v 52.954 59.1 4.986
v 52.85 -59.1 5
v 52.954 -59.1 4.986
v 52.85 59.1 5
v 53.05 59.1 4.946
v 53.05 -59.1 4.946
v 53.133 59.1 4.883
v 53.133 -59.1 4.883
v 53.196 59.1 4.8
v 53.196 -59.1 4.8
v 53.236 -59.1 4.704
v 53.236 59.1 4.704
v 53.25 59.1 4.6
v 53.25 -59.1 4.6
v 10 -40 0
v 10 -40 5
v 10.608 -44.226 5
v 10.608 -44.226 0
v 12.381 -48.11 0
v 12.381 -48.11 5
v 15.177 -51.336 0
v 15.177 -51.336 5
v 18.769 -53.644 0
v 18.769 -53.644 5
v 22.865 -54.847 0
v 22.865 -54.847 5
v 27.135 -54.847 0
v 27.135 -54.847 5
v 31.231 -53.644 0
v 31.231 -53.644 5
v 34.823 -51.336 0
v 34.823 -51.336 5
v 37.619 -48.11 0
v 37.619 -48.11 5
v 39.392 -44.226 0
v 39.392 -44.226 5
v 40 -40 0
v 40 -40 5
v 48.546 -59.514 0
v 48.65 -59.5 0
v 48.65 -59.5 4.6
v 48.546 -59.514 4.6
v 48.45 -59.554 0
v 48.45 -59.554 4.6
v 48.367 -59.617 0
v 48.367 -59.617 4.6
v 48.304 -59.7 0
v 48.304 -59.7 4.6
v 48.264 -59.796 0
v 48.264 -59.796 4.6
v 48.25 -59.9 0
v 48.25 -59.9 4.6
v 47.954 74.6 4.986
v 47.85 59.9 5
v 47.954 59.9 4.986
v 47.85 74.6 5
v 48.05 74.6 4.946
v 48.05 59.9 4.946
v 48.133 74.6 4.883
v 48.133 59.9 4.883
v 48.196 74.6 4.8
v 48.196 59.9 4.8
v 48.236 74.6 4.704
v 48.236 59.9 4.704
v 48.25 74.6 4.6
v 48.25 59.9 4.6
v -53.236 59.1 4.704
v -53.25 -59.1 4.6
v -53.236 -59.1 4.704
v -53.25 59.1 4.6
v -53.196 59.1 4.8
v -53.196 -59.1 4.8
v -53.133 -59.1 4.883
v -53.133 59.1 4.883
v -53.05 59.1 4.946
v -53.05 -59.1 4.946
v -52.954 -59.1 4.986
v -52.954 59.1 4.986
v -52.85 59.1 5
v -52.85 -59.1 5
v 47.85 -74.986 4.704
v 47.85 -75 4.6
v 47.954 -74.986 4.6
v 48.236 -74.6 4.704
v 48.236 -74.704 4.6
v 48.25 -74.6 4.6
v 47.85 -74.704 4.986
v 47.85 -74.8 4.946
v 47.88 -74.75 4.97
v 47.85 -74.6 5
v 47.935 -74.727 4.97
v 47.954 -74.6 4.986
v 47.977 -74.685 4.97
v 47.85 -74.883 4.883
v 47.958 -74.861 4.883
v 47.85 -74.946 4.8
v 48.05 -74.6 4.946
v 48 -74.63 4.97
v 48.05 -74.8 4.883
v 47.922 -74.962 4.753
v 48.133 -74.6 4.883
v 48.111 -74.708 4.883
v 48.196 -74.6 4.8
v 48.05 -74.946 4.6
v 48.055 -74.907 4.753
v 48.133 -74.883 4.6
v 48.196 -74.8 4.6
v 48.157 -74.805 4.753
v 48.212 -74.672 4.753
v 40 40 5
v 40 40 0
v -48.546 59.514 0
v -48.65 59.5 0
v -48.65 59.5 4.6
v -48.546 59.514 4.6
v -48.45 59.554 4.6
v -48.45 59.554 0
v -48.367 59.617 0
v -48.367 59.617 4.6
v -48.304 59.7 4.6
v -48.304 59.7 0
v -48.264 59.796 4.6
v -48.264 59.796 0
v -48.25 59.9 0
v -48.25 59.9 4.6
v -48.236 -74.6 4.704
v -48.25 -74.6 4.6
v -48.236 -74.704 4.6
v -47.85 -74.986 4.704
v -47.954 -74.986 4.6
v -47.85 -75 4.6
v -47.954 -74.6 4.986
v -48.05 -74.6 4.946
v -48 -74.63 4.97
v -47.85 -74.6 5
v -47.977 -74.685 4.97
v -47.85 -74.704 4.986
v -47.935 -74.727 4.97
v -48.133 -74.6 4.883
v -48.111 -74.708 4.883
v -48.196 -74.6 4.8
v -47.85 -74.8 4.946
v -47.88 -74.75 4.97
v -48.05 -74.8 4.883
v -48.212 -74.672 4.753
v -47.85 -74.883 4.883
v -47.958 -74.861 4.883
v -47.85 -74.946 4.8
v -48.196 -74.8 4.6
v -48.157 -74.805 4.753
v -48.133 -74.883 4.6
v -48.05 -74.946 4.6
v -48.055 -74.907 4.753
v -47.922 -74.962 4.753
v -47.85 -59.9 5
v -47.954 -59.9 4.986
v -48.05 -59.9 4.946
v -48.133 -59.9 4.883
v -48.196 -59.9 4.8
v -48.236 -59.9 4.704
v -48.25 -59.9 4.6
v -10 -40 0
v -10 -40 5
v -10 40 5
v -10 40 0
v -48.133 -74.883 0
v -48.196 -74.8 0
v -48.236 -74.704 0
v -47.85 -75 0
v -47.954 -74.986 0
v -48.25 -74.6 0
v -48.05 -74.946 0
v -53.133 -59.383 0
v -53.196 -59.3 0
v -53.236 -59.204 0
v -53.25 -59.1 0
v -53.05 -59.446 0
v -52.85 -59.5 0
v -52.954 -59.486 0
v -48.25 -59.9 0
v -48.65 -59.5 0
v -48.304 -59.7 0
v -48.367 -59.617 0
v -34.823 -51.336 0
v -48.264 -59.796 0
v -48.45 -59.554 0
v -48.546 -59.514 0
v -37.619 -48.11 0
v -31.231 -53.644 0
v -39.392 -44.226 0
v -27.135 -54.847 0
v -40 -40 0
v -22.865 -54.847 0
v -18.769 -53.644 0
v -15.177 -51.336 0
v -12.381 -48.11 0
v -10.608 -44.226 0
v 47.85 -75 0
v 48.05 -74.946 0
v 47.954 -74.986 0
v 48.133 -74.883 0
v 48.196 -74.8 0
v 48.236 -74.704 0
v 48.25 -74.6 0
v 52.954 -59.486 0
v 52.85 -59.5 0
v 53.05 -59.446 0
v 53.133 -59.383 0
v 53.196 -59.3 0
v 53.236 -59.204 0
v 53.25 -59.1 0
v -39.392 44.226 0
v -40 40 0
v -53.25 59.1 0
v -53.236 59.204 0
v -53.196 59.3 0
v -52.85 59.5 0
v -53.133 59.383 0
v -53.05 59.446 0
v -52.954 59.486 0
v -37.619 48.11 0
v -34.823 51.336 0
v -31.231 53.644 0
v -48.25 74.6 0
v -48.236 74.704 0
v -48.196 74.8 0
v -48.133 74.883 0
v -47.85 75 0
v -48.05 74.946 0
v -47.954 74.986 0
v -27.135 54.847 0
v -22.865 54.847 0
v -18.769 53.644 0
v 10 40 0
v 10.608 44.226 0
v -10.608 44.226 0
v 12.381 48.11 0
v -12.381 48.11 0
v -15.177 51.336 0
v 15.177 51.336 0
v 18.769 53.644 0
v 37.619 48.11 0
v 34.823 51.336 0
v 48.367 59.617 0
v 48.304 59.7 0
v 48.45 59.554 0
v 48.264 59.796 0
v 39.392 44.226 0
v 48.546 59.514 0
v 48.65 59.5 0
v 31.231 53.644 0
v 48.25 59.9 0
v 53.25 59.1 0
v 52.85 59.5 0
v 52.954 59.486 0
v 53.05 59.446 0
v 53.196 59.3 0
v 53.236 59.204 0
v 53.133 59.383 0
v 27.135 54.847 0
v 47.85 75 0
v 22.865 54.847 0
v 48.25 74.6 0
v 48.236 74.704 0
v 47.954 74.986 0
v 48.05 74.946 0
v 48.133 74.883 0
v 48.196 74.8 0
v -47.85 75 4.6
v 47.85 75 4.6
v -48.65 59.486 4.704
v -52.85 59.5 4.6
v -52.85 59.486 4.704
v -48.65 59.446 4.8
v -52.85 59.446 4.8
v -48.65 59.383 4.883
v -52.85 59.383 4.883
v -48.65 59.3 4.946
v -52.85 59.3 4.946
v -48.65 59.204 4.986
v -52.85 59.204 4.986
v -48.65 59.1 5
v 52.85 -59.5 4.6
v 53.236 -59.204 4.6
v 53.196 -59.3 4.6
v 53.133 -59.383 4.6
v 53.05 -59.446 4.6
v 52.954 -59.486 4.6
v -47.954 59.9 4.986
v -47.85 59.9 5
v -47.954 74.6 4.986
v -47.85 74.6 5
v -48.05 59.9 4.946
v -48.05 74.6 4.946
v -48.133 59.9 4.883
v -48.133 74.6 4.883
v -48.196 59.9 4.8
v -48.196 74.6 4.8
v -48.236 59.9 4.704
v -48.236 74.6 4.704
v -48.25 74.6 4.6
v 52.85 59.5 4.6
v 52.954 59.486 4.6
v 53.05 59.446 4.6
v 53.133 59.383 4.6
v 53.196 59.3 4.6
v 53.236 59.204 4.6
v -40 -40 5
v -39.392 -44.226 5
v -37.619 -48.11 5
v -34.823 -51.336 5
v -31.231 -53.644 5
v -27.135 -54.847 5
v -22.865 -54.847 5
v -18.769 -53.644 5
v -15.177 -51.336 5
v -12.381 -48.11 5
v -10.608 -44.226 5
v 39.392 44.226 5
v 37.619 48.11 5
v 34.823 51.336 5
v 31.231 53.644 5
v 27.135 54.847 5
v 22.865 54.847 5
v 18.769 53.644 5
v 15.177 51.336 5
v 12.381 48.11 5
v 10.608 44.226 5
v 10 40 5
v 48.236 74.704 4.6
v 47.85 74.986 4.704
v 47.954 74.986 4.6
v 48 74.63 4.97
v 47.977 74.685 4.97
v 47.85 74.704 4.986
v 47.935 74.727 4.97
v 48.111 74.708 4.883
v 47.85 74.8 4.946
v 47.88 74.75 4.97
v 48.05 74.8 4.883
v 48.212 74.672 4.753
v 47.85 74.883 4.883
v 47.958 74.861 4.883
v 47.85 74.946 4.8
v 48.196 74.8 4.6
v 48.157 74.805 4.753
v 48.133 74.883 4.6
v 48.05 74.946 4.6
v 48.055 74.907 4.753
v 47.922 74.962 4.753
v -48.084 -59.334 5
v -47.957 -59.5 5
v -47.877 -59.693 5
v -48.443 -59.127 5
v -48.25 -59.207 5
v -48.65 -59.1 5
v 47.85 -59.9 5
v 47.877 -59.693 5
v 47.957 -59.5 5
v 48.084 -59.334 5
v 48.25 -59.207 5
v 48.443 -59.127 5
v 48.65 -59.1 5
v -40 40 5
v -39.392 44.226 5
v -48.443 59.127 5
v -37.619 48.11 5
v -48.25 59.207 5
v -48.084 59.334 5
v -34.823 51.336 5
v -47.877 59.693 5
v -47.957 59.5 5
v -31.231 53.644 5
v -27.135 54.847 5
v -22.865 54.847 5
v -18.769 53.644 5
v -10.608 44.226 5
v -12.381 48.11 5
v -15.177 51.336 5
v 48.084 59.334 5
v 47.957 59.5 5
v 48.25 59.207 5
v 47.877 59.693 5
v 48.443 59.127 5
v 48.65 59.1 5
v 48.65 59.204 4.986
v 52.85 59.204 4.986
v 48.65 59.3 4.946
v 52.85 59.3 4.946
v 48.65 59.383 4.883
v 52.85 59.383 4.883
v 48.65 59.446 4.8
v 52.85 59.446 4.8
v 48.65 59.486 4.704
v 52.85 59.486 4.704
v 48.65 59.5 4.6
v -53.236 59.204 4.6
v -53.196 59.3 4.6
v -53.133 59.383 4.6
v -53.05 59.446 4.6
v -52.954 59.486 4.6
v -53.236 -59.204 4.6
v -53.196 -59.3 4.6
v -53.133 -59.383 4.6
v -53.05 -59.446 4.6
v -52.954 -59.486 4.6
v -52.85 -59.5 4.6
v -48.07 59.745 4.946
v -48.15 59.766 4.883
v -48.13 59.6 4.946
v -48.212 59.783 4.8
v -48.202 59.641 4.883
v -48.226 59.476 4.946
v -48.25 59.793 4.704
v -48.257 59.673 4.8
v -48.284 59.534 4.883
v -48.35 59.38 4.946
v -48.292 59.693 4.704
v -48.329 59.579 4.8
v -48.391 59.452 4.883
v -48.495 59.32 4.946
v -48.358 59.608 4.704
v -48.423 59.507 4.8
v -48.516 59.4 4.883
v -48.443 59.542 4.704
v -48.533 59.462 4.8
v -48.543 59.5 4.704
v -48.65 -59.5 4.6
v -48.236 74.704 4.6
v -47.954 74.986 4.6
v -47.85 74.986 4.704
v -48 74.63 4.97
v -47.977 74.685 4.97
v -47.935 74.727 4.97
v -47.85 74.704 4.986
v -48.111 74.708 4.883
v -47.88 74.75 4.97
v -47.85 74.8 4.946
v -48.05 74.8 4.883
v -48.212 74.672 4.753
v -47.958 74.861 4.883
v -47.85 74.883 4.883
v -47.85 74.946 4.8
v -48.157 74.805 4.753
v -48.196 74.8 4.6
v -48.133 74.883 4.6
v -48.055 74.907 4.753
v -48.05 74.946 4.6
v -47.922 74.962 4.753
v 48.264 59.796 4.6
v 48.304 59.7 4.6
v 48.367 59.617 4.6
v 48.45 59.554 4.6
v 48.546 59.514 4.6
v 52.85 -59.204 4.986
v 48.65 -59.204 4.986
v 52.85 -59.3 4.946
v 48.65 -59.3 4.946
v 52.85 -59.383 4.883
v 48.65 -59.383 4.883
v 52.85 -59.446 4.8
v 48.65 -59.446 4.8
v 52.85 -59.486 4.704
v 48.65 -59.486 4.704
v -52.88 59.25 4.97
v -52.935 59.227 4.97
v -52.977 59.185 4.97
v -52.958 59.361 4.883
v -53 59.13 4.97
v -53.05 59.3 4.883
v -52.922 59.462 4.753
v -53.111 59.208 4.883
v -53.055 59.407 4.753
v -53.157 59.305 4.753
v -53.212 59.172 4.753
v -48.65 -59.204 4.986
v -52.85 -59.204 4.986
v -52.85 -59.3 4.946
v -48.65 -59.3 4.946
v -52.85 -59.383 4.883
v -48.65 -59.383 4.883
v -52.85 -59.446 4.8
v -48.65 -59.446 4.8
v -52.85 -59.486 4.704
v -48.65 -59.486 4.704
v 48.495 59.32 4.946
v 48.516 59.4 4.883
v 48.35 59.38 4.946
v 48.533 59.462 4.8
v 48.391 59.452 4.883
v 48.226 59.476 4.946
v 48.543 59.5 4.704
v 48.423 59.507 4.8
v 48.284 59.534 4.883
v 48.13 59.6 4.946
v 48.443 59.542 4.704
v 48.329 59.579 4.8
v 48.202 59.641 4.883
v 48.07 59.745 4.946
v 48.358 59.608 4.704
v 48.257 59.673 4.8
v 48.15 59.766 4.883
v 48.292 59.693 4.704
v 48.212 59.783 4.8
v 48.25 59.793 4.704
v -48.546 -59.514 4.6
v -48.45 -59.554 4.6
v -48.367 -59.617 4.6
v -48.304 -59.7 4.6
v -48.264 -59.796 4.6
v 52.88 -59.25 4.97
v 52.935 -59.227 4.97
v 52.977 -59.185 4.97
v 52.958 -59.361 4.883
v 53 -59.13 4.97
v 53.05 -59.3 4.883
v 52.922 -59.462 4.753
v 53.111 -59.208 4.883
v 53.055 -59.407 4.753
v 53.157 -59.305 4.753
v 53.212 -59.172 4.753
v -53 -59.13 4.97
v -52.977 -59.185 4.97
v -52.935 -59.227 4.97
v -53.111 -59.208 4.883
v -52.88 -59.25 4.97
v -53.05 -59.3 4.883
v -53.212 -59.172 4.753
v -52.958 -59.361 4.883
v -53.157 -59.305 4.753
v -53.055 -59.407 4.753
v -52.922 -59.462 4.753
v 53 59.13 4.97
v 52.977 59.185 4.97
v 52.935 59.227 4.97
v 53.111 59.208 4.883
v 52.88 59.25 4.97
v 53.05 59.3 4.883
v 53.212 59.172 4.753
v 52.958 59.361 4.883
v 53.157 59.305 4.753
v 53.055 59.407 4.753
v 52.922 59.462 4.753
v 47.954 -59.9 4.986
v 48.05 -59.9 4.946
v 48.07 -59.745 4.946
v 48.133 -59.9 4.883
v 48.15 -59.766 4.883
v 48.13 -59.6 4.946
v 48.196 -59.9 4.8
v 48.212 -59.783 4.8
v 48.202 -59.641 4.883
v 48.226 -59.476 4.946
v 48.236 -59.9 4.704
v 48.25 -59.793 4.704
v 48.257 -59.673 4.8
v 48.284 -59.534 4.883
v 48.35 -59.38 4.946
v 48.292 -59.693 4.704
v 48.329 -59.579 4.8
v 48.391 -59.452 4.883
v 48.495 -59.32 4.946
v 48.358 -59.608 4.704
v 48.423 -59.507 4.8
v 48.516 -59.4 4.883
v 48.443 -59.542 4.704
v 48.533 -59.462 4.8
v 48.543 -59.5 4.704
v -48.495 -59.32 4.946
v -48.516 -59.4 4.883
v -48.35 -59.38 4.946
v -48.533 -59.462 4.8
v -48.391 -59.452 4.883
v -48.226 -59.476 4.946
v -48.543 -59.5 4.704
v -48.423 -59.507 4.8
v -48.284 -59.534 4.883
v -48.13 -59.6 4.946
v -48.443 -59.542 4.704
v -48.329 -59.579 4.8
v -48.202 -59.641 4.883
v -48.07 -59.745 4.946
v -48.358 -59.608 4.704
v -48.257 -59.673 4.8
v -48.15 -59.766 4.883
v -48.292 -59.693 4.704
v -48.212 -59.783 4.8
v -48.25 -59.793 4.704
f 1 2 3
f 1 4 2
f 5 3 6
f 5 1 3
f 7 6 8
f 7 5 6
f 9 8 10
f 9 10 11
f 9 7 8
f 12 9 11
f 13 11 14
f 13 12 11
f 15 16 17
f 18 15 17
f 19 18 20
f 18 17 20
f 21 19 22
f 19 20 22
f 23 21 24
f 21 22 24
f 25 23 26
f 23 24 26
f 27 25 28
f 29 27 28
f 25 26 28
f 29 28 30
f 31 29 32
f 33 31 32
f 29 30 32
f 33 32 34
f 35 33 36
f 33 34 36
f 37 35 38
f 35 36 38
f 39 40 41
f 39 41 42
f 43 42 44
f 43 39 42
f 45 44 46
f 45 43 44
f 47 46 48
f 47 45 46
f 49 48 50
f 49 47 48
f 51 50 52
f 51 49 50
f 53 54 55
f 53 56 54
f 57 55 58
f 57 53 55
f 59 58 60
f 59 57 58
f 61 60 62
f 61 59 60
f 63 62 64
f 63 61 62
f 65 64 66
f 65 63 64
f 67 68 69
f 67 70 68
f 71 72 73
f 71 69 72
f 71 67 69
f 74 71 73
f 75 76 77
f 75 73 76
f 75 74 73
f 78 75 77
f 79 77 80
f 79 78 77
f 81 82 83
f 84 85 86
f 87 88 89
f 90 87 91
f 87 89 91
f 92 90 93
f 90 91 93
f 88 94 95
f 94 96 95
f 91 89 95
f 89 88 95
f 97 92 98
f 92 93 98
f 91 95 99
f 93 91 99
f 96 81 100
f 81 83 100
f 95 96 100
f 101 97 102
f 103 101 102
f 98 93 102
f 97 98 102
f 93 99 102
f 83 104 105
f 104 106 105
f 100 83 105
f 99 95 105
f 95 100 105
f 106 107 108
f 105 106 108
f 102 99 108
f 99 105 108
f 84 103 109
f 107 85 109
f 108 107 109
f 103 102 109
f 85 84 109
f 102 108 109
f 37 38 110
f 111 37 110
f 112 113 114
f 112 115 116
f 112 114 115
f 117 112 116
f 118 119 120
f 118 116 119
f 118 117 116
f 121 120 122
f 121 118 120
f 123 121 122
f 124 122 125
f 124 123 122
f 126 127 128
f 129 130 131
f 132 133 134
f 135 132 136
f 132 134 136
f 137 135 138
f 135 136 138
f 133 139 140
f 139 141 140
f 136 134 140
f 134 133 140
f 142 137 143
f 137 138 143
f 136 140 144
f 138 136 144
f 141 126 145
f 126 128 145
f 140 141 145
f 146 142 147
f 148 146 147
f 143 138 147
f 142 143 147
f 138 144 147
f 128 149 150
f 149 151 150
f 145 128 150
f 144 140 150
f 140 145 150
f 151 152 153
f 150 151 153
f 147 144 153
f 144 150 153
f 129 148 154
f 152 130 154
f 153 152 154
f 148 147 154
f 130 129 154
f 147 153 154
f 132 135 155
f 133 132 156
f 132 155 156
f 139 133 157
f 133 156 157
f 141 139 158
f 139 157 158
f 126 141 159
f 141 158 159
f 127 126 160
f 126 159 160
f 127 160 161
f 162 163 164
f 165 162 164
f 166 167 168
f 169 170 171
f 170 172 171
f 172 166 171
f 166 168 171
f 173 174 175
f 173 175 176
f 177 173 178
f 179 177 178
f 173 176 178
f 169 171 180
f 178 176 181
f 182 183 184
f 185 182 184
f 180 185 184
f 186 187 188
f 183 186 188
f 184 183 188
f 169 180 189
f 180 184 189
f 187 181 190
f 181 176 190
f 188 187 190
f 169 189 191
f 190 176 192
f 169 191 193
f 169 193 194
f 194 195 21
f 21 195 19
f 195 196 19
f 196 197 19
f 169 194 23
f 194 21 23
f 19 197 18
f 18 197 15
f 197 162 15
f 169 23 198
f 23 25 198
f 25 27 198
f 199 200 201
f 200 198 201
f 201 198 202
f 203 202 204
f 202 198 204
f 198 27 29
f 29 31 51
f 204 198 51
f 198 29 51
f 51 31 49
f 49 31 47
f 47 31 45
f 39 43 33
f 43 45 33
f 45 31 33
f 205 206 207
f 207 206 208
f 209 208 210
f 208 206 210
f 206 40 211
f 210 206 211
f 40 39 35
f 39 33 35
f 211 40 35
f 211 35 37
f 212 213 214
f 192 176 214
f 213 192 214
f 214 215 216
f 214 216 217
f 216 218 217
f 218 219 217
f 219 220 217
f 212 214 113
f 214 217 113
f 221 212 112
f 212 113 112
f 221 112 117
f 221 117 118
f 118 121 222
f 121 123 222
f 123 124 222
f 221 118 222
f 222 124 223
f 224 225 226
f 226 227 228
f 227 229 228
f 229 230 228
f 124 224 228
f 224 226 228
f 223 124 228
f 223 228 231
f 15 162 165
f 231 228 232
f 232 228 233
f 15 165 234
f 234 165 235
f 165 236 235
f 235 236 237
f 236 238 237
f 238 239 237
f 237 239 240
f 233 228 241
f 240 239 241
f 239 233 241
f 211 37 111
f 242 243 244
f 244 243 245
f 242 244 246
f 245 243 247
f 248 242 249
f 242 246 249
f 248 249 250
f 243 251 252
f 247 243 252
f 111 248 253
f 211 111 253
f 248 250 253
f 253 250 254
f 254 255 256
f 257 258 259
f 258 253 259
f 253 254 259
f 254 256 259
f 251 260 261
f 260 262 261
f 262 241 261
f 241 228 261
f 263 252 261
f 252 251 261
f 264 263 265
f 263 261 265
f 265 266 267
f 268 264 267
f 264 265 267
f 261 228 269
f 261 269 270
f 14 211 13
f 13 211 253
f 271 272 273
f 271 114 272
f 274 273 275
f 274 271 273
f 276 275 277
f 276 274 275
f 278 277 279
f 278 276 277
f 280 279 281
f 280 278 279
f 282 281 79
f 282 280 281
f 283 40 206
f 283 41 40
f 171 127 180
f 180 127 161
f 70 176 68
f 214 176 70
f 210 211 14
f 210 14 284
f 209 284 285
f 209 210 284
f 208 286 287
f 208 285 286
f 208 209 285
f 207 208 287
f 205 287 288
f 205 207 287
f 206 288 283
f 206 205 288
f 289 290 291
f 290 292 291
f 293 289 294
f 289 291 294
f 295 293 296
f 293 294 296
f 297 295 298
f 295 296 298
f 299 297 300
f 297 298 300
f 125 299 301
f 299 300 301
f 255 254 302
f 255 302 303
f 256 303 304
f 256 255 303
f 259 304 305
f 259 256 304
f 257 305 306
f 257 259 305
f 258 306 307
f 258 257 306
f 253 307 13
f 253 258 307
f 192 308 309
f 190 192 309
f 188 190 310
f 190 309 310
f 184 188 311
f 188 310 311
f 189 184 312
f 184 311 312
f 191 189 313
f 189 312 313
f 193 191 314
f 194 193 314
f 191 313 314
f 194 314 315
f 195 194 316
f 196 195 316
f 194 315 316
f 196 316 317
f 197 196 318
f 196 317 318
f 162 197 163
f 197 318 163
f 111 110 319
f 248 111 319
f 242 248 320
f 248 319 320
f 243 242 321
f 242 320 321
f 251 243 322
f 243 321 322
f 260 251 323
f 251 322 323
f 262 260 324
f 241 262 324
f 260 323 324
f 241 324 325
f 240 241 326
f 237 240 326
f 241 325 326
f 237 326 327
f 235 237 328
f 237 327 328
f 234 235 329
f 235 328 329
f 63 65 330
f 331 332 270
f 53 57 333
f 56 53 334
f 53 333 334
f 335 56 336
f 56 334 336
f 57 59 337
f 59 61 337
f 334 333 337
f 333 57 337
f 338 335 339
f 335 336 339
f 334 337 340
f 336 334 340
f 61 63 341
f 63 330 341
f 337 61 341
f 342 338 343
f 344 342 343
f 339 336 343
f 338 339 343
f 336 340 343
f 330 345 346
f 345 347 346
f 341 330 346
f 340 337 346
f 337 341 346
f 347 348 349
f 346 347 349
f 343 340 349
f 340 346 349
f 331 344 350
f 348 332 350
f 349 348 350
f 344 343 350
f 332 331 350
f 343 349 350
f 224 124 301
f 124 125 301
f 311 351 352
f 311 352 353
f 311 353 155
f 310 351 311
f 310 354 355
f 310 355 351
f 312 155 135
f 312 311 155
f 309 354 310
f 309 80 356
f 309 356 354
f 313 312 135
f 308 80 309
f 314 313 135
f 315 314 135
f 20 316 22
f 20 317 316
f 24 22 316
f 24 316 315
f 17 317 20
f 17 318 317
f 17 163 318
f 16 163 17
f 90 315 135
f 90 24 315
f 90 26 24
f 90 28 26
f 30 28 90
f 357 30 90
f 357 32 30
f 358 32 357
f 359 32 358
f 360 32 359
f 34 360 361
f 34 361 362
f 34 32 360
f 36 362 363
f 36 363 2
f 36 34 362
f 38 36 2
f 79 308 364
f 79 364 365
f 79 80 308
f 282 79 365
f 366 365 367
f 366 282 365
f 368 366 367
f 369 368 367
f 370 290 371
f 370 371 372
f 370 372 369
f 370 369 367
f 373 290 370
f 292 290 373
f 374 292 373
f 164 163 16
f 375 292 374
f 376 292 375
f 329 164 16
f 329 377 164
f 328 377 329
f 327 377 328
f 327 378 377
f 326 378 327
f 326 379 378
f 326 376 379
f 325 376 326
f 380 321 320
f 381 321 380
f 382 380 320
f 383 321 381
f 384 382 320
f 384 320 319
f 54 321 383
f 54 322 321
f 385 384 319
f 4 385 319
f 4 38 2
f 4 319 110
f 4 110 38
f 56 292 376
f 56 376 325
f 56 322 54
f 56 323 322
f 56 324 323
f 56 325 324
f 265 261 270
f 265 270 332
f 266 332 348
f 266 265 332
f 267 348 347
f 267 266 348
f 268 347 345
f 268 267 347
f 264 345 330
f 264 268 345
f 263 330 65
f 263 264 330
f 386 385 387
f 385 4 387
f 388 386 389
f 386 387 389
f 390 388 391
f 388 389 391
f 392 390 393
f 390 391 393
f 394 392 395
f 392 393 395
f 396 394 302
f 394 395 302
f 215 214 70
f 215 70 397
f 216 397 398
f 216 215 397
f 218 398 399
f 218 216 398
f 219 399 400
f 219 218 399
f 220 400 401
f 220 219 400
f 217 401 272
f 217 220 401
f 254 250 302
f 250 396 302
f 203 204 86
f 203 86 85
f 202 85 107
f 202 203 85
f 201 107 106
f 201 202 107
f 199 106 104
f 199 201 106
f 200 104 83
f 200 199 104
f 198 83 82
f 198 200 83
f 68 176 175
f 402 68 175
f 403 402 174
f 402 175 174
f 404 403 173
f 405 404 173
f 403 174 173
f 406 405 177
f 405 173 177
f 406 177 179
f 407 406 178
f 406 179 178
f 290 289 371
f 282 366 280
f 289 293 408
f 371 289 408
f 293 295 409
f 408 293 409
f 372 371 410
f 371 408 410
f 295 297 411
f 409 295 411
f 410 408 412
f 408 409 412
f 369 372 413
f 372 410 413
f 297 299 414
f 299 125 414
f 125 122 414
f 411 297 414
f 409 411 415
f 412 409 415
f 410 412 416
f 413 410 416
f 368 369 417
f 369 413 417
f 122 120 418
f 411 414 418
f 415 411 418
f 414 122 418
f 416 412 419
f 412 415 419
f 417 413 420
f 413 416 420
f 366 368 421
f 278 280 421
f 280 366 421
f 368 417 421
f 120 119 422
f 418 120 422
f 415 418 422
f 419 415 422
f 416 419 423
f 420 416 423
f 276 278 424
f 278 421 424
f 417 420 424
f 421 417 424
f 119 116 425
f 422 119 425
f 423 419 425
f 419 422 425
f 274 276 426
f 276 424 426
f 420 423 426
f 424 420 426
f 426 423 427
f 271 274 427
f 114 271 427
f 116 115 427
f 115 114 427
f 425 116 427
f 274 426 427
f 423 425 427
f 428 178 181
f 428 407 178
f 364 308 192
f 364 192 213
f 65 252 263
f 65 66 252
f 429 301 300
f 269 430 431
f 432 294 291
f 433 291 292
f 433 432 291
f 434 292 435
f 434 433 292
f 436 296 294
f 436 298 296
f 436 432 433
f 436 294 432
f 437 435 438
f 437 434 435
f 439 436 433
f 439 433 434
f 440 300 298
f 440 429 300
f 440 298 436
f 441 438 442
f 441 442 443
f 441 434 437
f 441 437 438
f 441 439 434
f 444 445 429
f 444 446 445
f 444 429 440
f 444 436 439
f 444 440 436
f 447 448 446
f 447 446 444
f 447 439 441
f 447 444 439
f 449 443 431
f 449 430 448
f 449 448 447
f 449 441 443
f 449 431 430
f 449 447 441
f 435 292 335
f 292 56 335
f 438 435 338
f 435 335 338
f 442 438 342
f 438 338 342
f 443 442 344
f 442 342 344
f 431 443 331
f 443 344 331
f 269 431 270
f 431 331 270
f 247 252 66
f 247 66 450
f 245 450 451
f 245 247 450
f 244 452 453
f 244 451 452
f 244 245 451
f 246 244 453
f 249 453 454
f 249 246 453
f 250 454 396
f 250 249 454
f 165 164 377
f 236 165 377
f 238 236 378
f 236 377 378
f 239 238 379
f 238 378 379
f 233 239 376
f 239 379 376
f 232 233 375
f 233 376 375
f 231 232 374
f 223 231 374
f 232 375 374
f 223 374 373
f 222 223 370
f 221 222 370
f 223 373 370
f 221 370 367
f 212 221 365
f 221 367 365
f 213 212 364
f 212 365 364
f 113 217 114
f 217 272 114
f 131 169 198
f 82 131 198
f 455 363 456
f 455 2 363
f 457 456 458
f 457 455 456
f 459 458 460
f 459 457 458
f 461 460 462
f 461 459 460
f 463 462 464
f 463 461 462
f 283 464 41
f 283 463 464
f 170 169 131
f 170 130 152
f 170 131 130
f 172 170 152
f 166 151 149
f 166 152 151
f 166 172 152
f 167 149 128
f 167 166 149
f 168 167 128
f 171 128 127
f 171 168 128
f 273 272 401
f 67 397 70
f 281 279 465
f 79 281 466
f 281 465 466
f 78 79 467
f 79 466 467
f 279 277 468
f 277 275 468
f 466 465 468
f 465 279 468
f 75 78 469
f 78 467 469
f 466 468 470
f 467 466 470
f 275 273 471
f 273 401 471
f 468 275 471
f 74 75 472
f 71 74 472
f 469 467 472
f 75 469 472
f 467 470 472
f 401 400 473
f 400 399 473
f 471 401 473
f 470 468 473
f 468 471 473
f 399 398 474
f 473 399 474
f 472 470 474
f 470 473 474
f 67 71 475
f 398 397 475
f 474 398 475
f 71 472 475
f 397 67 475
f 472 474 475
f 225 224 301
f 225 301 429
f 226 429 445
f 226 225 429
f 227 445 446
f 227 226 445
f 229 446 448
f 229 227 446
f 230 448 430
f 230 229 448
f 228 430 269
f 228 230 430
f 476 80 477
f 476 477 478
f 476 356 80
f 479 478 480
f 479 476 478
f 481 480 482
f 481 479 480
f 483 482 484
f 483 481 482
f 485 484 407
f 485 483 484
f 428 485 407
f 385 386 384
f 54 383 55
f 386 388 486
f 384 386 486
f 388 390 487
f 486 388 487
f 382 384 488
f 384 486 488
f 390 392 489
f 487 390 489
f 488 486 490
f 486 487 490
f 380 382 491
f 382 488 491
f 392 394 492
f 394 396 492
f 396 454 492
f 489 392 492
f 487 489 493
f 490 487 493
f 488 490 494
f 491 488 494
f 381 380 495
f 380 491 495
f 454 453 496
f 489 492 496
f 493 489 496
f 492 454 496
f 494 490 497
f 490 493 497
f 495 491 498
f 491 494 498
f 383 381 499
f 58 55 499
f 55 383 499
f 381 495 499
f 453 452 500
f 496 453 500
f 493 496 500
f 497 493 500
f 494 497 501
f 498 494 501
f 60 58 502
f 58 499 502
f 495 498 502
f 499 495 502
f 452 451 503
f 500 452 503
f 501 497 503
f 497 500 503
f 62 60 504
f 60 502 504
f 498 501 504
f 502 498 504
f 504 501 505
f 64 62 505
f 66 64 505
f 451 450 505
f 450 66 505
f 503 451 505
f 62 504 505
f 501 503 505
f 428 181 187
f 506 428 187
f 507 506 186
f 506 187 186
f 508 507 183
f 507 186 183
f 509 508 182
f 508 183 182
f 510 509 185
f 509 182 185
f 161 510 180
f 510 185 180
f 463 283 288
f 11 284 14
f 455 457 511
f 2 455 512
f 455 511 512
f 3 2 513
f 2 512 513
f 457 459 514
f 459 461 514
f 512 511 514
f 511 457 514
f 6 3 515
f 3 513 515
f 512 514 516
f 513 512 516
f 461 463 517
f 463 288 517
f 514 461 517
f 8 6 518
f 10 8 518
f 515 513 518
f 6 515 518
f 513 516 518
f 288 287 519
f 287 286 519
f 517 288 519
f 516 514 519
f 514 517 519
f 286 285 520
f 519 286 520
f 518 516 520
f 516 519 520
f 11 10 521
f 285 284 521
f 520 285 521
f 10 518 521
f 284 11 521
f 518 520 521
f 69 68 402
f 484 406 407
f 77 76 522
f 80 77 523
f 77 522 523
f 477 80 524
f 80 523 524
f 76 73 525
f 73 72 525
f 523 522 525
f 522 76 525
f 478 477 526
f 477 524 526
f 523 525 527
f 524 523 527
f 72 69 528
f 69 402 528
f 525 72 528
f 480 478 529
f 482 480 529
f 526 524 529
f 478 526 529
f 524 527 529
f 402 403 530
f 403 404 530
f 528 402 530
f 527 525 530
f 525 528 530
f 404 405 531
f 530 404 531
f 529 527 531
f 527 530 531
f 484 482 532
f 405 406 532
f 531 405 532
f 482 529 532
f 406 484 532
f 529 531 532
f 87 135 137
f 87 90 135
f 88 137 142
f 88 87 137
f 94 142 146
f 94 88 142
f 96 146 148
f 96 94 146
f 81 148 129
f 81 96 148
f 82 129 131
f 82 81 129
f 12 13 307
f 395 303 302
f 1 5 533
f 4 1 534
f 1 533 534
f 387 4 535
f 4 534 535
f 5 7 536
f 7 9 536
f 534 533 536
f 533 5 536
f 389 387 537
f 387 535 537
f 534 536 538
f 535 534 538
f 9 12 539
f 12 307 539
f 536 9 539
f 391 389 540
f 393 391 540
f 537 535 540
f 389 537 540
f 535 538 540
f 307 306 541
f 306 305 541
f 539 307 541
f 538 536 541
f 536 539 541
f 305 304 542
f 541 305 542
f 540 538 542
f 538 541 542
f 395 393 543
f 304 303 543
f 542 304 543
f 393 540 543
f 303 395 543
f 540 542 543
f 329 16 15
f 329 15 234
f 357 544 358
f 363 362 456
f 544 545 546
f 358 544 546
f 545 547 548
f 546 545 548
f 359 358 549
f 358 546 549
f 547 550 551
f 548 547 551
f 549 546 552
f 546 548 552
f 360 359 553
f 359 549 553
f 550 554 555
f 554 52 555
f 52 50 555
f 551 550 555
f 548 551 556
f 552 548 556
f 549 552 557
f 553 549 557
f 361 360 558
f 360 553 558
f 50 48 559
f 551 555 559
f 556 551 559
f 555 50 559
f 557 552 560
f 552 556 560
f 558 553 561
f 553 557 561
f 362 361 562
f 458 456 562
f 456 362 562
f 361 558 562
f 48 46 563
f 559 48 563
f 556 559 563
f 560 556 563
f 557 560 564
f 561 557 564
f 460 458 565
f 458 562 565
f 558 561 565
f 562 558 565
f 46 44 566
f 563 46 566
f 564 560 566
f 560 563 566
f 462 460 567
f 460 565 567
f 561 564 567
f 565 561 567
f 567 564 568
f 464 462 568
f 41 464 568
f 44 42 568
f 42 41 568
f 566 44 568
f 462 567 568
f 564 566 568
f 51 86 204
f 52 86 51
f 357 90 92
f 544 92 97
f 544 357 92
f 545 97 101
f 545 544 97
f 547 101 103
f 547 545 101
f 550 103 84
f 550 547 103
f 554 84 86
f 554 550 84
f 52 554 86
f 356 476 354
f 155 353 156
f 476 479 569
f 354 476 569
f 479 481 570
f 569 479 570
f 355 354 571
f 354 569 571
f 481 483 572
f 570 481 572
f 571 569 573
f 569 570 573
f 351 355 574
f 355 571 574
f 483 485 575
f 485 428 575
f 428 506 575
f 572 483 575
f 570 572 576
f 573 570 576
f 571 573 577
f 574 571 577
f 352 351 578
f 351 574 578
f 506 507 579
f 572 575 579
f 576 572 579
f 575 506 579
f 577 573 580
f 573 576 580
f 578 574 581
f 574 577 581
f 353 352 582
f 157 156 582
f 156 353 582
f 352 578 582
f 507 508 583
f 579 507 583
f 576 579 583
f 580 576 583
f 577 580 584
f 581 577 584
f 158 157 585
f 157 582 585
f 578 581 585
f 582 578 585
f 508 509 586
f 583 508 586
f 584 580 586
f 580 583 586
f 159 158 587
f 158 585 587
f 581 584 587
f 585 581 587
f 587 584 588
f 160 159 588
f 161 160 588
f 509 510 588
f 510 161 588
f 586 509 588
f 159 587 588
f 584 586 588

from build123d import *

# Parameters (mm, degrees)
SKETCH_W        = 106.5
SKETCH_H        = 150
PAD_DEPTH       = 5
SKETCH001_W     = 5
SKETCH001_H     = 15.5
POCKET_DEPTH    = 5
FILLET_R        = 0.4
POCKET001_DEPTH = 5


with BuildPart() as part:
    # Sketch → Pad (new body)
    with BuildSketch(Plane.XY):
        Rectangle(SKETCH_W, SKETCH_H)
    extrude(amount=PAD_DEPTH)

    # Sketch001 (on Face6 of Pad) → Pocket (cut)
    with BuildSketch(Plane.XY.offset(5)):
        with Locations((-50.75, 67.25)):
            Rectangle(SKETCH001_W, SKETCH001_H)
        with Locations((50.75, 67.25)):
            Rectangle(SKETCH001_W, SKETCH001_H)
        with Locations((50.75, -67.25)):
            Rectangle(SKETCH001_W, SKETCH001_H)
        with Locations((-50.75, -67.25)):
            Rectangle(SKETCH001_W, SKETCH001_H)
    extrude(amount=-POCKET_DEPTH, mode=Mode.SUBTRACT)

    # Fillet
    fillet_edges = [part.edges().sort_by_distance(p)[0] for p in [
        (-48.25, 75, 2.5),
        (-48.25, 59.5, 2.5),
        (-53.25, 59.5, 2.5),
        (48.25, 75, 2.5),
        (48.25, 59.5, 2.5),
        (53.25, 59.5, 2.5),
        (53.25, -59.5, 2.5),
        (48.25, -59.5, 2.5),
        (48.25, -75, 2.5),
        (-48.25, -75, 2.5),
        (-48.25, -59.5, 2.5),
        (-53.25, -59.5, 2.5),
        (-48.25, 67.25, 5),
        (-50.75, 59.5, 5),
        (-53.25, 0, 5),
        (-50.75, -59.5, 5),
        (-48.25, -67.25, 5),
        (0, -75, 5),
        (48.25, -67.25, 5),
        (50.75, -59.5, 5),
        (53.25, 0, 5),
        (50.75, 59.5, 5),
        (48.25, 67.25, 5),
        (0, 75, 5),
    ]]
    fillet(fillet_edges, radius=FILLET_R)

    # Sketch002 (on Face29 of Fillet) → Pocket001 (cut)
    with BuildSketch(Plane.XY.offset(5)):
        with BuildLine():
            ThreePointArc((-40, -40), (-25, -55), (-10, -40))
            Line((-10, -40), (-10, 40))
            ThreePointArc((-10, 40), (-25, 55), (-40, 40))
            Line((-40, -40), (-40, 40))
        make_face()
        with BuildLine():
            ThreePointArc((10, -40), (25, -55), (40, -40))
            Line((40, -40), (40, 40))
            ThreePointArc((40, 40), (25, 55), (10, 40))
            Line((10, -40), (10, 40))
        make_face()
    extrude(amount=-POCKET001_DEPTH, mode=Mode.SUBTRACT)


solid = part.part
